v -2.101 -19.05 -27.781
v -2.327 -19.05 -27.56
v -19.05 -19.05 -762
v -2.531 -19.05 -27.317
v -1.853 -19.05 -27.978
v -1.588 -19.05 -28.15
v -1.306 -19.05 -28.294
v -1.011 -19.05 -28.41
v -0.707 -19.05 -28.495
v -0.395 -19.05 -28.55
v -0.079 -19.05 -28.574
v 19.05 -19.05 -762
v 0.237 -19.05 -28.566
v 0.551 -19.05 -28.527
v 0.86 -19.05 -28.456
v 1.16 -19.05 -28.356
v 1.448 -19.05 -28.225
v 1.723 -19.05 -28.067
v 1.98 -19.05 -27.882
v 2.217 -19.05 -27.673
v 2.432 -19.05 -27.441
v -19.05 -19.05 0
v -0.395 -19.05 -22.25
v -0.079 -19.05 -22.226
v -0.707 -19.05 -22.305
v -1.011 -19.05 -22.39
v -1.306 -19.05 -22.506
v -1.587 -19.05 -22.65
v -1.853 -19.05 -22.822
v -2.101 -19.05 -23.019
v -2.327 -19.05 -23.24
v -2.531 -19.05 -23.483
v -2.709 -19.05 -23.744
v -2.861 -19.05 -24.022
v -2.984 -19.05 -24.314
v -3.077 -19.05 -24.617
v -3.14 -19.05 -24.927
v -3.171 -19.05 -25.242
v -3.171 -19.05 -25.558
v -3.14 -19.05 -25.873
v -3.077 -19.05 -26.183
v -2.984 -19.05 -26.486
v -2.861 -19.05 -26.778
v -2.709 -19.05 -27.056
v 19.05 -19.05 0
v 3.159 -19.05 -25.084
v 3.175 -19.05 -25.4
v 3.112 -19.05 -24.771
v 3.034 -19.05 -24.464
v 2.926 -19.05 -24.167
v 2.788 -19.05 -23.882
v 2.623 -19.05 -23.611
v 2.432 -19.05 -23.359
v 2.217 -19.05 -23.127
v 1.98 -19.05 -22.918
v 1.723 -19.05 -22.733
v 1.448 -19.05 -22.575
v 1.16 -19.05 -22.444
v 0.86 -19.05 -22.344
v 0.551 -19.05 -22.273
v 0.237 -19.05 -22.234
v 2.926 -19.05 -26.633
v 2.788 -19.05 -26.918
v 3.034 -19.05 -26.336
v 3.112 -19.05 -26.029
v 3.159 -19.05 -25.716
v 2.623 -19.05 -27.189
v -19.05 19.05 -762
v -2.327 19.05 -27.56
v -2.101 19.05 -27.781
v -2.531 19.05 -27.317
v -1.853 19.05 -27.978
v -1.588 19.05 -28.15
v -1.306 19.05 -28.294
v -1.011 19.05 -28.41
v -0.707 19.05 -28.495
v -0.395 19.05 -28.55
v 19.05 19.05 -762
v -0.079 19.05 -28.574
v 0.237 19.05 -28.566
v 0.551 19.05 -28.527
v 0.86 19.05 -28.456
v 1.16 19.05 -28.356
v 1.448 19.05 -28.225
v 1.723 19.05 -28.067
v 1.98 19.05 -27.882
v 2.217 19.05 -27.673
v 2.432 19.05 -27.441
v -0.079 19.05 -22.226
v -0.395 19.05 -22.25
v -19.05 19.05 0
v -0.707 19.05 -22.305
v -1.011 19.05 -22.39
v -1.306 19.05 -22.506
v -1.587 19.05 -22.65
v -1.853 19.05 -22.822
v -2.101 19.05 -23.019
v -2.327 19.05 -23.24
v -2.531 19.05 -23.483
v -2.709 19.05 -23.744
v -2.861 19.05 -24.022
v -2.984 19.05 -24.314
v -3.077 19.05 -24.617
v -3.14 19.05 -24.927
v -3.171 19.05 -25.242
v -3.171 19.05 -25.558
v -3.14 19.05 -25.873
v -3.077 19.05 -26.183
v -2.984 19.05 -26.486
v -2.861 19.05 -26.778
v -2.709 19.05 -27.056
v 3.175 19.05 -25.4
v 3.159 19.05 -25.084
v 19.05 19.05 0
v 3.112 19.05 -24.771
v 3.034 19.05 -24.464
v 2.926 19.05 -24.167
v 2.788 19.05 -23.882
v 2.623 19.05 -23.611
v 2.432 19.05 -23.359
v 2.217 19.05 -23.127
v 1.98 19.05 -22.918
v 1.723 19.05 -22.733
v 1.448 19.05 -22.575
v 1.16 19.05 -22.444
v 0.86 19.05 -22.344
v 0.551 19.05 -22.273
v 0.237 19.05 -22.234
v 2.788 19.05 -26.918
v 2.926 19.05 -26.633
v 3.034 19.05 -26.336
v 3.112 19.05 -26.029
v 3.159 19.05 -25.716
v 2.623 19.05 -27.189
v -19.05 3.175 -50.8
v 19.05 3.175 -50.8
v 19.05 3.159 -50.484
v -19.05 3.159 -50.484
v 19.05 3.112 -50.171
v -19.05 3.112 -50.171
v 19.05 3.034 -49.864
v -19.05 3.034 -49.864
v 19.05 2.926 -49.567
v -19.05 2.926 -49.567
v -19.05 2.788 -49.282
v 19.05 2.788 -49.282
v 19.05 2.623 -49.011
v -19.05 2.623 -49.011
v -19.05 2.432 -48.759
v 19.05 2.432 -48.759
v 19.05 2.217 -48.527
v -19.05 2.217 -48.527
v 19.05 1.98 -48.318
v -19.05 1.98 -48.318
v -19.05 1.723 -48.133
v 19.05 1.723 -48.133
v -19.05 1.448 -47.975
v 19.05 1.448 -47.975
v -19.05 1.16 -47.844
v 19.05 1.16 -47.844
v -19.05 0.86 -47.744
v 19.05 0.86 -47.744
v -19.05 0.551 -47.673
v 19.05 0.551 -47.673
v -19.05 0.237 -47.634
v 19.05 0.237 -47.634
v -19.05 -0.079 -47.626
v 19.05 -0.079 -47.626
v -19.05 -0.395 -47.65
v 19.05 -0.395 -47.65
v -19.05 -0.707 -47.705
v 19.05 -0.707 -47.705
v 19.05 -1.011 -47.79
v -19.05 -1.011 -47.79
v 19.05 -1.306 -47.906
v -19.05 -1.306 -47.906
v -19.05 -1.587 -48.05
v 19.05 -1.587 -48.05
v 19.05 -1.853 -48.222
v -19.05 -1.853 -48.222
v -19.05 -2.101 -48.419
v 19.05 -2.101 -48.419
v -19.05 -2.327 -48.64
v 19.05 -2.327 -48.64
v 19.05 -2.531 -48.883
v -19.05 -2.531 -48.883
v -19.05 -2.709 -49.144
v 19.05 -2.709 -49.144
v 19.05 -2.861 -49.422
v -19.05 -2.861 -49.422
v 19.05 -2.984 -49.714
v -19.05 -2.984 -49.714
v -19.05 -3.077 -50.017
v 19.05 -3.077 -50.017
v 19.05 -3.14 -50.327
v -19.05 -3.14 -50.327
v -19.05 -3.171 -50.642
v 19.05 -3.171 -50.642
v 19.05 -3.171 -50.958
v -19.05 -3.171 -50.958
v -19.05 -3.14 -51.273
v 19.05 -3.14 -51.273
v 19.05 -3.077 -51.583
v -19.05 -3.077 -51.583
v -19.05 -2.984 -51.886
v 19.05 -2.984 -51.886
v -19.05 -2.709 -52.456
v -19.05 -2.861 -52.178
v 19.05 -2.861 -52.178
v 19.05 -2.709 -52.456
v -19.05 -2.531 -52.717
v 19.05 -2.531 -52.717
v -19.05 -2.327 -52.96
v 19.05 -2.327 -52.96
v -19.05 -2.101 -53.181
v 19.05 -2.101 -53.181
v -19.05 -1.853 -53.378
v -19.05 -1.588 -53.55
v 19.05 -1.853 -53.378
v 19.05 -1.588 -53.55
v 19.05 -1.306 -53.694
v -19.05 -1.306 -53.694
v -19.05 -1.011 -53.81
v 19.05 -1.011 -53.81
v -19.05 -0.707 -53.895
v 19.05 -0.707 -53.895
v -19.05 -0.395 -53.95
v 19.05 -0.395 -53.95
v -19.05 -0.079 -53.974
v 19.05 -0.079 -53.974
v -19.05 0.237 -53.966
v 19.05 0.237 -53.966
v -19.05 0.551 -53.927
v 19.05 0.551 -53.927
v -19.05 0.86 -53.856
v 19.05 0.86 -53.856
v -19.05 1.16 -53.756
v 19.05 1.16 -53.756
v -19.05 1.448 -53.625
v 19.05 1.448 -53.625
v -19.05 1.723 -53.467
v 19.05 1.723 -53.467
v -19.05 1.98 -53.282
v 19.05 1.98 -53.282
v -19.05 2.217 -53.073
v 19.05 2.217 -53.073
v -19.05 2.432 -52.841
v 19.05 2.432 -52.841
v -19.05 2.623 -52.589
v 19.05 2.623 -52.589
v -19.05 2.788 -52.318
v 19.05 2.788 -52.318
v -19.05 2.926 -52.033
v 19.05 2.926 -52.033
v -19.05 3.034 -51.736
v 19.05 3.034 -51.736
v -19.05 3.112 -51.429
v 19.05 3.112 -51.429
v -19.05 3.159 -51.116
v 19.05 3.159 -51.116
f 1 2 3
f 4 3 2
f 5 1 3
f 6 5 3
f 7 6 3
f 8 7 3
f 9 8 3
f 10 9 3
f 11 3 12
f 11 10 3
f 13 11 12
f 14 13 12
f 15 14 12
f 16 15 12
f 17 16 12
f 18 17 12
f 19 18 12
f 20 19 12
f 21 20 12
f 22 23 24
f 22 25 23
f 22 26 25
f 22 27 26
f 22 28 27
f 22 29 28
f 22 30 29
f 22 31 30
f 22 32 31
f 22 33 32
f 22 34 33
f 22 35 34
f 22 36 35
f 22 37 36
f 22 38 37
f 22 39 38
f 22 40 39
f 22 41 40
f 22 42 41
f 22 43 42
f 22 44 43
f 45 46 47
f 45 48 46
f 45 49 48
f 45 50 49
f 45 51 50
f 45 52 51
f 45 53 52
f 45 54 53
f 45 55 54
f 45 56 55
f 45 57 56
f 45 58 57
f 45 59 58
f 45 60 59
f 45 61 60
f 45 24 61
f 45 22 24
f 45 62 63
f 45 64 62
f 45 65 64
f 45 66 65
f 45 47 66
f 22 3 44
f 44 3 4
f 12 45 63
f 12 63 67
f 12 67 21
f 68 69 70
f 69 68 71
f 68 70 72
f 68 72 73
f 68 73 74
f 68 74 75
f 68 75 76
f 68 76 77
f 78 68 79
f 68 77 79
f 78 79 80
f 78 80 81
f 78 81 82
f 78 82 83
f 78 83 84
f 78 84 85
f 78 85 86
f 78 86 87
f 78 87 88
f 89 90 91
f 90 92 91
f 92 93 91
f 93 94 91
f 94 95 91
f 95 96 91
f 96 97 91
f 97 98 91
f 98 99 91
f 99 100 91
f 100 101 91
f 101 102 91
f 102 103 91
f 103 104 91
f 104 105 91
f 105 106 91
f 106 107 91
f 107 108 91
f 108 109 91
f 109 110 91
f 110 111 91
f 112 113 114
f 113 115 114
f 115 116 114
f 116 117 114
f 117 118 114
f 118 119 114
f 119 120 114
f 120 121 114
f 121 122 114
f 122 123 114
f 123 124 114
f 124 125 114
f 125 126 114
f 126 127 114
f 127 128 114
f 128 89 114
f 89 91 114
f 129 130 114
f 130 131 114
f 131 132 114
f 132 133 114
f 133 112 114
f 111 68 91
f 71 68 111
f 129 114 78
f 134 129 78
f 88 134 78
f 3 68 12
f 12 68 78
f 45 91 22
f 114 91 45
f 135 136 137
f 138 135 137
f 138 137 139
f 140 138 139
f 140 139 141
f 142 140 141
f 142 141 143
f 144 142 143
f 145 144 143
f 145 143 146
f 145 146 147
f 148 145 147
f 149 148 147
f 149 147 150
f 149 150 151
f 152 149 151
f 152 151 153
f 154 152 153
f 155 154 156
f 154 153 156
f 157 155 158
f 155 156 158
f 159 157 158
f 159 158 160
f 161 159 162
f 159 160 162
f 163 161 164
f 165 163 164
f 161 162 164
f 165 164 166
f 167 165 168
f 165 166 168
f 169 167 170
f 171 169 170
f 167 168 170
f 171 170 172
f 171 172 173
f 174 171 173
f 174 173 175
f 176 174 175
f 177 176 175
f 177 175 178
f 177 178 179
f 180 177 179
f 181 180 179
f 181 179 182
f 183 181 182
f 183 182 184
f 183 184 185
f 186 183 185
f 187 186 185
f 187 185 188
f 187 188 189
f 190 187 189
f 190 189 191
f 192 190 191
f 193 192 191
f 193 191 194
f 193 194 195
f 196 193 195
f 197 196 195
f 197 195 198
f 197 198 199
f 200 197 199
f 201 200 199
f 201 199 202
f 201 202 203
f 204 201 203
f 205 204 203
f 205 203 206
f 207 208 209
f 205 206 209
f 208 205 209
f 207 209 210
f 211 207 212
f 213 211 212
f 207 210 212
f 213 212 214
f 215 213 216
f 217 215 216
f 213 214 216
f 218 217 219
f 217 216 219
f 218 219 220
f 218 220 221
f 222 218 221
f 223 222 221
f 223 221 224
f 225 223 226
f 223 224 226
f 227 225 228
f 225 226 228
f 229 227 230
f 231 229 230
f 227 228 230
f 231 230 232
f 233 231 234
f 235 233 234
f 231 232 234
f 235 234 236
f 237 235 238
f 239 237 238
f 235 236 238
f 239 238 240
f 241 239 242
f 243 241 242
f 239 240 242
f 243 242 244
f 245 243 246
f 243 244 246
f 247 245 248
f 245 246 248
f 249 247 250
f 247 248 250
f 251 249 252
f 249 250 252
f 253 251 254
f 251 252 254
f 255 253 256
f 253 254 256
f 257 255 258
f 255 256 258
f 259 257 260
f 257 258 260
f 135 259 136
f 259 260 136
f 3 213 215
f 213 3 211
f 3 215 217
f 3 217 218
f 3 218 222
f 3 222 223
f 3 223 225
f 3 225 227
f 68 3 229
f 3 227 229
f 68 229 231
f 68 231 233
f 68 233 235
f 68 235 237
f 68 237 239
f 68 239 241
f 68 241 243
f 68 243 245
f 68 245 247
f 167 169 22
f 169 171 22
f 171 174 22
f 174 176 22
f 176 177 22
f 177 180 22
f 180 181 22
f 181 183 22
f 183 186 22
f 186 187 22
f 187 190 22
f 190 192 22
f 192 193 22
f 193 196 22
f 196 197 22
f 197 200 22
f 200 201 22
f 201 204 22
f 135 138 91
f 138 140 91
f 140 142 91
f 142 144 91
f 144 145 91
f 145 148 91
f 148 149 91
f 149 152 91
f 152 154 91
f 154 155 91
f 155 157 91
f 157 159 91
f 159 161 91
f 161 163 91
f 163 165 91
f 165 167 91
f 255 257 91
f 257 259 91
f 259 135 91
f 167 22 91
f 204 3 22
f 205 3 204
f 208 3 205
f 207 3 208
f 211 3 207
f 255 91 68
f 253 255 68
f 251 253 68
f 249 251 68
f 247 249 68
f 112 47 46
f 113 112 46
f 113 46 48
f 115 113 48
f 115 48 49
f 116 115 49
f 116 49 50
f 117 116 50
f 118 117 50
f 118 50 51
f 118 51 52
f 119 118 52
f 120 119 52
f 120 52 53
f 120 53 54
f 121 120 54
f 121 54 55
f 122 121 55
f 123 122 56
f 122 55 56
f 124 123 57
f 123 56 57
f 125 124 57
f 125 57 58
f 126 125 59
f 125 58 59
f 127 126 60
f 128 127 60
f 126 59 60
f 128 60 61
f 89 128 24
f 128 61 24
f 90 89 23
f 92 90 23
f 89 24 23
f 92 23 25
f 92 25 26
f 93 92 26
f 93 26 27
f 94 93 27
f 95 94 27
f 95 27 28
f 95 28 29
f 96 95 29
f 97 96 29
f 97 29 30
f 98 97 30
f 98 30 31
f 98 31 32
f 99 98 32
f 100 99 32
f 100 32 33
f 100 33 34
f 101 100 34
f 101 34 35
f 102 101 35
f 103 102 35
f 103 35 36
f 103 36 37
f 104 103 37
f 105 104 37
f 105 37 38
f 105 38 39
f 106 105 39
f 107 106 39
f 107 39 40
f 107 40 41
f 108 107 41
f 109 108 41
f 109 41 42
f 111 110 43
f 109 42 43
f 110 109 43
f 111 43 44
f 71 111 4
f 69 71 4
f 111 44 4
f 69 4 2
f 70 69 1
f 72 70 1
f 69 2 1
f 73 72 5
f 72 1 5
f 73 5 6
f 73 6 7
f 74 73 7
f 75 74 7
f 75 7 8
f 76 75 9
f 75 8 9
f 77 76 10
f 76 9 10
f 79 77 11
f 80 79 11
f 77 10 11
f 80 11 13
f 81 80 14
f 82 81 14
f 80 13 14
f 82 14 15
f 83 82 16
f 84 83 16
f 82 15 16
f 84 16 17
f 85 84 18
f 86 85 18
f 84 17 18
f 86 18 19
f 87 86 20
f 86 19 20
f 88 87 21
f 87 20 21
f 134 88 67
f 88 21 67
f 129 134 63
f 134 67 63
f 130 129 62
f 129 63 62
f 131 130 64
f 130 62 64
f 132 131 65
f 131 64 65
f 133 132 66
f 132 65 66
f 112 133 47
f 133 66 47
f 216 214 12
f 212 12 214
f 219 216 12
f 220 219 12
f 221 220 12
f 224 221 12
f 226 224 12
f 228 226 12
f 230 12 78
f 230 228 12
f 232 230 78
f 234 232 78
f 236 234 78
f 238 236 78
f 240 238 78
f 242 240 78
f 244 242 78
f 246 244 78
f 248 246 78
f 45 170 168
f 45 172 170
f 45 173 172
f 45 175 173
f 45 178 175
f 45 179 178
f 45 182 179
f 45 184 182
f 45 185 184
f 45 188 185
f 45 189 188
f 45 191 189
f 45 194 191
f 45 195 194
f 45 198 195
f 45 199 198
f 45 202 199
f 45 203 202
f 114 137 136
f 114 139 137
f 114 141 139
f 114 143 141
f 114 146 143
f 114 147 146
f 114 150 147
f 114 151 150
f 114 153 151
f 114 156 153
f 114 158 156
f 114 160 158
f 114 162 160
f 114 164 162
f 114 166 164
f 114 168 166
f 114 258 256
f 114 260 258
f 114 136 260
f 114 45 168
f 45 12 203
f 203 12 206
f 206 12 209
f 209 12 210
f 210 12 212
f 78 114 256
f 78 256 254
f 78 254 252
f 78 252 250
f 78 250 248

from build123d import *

# Parameters (mm, degrees)
F0_W     = 38.1
F0_H     = 38.1
F1_DEPTH = 762
F2_R     = 3.175
F3_DEPTH = 38.101
F4_R     = 3.175
F5_DEPTH = 38.101


with BuildPart() as f1:
    # F0 (on Top) → F1 (new body)
    with BuildSketch(Plane.XY):
        Rectangle(F0_W, F0_H)
    extrude(amount=-F1_DEPTH)

    # F2 (on face) → F3 (cut, through all)
    with BuildSketch(Plane.XZ.offset(19.05)):
        with Locations((0, -25.4)):
            Circle(F2_R)
    extrude(amount=-F3_DEPTH, mode=Mode.SUBTRACT)

    # F4 (on face) → F5 (cut, through all)
    with BuildSketch(Plane.YZ.offset(19.05)):
        with Locations((0, -50.8)):
            Circle(F4_R)
    extrude(amount=-F5_DEPTH, mode=Mode.SUBTRACT)


solid = f1.part
